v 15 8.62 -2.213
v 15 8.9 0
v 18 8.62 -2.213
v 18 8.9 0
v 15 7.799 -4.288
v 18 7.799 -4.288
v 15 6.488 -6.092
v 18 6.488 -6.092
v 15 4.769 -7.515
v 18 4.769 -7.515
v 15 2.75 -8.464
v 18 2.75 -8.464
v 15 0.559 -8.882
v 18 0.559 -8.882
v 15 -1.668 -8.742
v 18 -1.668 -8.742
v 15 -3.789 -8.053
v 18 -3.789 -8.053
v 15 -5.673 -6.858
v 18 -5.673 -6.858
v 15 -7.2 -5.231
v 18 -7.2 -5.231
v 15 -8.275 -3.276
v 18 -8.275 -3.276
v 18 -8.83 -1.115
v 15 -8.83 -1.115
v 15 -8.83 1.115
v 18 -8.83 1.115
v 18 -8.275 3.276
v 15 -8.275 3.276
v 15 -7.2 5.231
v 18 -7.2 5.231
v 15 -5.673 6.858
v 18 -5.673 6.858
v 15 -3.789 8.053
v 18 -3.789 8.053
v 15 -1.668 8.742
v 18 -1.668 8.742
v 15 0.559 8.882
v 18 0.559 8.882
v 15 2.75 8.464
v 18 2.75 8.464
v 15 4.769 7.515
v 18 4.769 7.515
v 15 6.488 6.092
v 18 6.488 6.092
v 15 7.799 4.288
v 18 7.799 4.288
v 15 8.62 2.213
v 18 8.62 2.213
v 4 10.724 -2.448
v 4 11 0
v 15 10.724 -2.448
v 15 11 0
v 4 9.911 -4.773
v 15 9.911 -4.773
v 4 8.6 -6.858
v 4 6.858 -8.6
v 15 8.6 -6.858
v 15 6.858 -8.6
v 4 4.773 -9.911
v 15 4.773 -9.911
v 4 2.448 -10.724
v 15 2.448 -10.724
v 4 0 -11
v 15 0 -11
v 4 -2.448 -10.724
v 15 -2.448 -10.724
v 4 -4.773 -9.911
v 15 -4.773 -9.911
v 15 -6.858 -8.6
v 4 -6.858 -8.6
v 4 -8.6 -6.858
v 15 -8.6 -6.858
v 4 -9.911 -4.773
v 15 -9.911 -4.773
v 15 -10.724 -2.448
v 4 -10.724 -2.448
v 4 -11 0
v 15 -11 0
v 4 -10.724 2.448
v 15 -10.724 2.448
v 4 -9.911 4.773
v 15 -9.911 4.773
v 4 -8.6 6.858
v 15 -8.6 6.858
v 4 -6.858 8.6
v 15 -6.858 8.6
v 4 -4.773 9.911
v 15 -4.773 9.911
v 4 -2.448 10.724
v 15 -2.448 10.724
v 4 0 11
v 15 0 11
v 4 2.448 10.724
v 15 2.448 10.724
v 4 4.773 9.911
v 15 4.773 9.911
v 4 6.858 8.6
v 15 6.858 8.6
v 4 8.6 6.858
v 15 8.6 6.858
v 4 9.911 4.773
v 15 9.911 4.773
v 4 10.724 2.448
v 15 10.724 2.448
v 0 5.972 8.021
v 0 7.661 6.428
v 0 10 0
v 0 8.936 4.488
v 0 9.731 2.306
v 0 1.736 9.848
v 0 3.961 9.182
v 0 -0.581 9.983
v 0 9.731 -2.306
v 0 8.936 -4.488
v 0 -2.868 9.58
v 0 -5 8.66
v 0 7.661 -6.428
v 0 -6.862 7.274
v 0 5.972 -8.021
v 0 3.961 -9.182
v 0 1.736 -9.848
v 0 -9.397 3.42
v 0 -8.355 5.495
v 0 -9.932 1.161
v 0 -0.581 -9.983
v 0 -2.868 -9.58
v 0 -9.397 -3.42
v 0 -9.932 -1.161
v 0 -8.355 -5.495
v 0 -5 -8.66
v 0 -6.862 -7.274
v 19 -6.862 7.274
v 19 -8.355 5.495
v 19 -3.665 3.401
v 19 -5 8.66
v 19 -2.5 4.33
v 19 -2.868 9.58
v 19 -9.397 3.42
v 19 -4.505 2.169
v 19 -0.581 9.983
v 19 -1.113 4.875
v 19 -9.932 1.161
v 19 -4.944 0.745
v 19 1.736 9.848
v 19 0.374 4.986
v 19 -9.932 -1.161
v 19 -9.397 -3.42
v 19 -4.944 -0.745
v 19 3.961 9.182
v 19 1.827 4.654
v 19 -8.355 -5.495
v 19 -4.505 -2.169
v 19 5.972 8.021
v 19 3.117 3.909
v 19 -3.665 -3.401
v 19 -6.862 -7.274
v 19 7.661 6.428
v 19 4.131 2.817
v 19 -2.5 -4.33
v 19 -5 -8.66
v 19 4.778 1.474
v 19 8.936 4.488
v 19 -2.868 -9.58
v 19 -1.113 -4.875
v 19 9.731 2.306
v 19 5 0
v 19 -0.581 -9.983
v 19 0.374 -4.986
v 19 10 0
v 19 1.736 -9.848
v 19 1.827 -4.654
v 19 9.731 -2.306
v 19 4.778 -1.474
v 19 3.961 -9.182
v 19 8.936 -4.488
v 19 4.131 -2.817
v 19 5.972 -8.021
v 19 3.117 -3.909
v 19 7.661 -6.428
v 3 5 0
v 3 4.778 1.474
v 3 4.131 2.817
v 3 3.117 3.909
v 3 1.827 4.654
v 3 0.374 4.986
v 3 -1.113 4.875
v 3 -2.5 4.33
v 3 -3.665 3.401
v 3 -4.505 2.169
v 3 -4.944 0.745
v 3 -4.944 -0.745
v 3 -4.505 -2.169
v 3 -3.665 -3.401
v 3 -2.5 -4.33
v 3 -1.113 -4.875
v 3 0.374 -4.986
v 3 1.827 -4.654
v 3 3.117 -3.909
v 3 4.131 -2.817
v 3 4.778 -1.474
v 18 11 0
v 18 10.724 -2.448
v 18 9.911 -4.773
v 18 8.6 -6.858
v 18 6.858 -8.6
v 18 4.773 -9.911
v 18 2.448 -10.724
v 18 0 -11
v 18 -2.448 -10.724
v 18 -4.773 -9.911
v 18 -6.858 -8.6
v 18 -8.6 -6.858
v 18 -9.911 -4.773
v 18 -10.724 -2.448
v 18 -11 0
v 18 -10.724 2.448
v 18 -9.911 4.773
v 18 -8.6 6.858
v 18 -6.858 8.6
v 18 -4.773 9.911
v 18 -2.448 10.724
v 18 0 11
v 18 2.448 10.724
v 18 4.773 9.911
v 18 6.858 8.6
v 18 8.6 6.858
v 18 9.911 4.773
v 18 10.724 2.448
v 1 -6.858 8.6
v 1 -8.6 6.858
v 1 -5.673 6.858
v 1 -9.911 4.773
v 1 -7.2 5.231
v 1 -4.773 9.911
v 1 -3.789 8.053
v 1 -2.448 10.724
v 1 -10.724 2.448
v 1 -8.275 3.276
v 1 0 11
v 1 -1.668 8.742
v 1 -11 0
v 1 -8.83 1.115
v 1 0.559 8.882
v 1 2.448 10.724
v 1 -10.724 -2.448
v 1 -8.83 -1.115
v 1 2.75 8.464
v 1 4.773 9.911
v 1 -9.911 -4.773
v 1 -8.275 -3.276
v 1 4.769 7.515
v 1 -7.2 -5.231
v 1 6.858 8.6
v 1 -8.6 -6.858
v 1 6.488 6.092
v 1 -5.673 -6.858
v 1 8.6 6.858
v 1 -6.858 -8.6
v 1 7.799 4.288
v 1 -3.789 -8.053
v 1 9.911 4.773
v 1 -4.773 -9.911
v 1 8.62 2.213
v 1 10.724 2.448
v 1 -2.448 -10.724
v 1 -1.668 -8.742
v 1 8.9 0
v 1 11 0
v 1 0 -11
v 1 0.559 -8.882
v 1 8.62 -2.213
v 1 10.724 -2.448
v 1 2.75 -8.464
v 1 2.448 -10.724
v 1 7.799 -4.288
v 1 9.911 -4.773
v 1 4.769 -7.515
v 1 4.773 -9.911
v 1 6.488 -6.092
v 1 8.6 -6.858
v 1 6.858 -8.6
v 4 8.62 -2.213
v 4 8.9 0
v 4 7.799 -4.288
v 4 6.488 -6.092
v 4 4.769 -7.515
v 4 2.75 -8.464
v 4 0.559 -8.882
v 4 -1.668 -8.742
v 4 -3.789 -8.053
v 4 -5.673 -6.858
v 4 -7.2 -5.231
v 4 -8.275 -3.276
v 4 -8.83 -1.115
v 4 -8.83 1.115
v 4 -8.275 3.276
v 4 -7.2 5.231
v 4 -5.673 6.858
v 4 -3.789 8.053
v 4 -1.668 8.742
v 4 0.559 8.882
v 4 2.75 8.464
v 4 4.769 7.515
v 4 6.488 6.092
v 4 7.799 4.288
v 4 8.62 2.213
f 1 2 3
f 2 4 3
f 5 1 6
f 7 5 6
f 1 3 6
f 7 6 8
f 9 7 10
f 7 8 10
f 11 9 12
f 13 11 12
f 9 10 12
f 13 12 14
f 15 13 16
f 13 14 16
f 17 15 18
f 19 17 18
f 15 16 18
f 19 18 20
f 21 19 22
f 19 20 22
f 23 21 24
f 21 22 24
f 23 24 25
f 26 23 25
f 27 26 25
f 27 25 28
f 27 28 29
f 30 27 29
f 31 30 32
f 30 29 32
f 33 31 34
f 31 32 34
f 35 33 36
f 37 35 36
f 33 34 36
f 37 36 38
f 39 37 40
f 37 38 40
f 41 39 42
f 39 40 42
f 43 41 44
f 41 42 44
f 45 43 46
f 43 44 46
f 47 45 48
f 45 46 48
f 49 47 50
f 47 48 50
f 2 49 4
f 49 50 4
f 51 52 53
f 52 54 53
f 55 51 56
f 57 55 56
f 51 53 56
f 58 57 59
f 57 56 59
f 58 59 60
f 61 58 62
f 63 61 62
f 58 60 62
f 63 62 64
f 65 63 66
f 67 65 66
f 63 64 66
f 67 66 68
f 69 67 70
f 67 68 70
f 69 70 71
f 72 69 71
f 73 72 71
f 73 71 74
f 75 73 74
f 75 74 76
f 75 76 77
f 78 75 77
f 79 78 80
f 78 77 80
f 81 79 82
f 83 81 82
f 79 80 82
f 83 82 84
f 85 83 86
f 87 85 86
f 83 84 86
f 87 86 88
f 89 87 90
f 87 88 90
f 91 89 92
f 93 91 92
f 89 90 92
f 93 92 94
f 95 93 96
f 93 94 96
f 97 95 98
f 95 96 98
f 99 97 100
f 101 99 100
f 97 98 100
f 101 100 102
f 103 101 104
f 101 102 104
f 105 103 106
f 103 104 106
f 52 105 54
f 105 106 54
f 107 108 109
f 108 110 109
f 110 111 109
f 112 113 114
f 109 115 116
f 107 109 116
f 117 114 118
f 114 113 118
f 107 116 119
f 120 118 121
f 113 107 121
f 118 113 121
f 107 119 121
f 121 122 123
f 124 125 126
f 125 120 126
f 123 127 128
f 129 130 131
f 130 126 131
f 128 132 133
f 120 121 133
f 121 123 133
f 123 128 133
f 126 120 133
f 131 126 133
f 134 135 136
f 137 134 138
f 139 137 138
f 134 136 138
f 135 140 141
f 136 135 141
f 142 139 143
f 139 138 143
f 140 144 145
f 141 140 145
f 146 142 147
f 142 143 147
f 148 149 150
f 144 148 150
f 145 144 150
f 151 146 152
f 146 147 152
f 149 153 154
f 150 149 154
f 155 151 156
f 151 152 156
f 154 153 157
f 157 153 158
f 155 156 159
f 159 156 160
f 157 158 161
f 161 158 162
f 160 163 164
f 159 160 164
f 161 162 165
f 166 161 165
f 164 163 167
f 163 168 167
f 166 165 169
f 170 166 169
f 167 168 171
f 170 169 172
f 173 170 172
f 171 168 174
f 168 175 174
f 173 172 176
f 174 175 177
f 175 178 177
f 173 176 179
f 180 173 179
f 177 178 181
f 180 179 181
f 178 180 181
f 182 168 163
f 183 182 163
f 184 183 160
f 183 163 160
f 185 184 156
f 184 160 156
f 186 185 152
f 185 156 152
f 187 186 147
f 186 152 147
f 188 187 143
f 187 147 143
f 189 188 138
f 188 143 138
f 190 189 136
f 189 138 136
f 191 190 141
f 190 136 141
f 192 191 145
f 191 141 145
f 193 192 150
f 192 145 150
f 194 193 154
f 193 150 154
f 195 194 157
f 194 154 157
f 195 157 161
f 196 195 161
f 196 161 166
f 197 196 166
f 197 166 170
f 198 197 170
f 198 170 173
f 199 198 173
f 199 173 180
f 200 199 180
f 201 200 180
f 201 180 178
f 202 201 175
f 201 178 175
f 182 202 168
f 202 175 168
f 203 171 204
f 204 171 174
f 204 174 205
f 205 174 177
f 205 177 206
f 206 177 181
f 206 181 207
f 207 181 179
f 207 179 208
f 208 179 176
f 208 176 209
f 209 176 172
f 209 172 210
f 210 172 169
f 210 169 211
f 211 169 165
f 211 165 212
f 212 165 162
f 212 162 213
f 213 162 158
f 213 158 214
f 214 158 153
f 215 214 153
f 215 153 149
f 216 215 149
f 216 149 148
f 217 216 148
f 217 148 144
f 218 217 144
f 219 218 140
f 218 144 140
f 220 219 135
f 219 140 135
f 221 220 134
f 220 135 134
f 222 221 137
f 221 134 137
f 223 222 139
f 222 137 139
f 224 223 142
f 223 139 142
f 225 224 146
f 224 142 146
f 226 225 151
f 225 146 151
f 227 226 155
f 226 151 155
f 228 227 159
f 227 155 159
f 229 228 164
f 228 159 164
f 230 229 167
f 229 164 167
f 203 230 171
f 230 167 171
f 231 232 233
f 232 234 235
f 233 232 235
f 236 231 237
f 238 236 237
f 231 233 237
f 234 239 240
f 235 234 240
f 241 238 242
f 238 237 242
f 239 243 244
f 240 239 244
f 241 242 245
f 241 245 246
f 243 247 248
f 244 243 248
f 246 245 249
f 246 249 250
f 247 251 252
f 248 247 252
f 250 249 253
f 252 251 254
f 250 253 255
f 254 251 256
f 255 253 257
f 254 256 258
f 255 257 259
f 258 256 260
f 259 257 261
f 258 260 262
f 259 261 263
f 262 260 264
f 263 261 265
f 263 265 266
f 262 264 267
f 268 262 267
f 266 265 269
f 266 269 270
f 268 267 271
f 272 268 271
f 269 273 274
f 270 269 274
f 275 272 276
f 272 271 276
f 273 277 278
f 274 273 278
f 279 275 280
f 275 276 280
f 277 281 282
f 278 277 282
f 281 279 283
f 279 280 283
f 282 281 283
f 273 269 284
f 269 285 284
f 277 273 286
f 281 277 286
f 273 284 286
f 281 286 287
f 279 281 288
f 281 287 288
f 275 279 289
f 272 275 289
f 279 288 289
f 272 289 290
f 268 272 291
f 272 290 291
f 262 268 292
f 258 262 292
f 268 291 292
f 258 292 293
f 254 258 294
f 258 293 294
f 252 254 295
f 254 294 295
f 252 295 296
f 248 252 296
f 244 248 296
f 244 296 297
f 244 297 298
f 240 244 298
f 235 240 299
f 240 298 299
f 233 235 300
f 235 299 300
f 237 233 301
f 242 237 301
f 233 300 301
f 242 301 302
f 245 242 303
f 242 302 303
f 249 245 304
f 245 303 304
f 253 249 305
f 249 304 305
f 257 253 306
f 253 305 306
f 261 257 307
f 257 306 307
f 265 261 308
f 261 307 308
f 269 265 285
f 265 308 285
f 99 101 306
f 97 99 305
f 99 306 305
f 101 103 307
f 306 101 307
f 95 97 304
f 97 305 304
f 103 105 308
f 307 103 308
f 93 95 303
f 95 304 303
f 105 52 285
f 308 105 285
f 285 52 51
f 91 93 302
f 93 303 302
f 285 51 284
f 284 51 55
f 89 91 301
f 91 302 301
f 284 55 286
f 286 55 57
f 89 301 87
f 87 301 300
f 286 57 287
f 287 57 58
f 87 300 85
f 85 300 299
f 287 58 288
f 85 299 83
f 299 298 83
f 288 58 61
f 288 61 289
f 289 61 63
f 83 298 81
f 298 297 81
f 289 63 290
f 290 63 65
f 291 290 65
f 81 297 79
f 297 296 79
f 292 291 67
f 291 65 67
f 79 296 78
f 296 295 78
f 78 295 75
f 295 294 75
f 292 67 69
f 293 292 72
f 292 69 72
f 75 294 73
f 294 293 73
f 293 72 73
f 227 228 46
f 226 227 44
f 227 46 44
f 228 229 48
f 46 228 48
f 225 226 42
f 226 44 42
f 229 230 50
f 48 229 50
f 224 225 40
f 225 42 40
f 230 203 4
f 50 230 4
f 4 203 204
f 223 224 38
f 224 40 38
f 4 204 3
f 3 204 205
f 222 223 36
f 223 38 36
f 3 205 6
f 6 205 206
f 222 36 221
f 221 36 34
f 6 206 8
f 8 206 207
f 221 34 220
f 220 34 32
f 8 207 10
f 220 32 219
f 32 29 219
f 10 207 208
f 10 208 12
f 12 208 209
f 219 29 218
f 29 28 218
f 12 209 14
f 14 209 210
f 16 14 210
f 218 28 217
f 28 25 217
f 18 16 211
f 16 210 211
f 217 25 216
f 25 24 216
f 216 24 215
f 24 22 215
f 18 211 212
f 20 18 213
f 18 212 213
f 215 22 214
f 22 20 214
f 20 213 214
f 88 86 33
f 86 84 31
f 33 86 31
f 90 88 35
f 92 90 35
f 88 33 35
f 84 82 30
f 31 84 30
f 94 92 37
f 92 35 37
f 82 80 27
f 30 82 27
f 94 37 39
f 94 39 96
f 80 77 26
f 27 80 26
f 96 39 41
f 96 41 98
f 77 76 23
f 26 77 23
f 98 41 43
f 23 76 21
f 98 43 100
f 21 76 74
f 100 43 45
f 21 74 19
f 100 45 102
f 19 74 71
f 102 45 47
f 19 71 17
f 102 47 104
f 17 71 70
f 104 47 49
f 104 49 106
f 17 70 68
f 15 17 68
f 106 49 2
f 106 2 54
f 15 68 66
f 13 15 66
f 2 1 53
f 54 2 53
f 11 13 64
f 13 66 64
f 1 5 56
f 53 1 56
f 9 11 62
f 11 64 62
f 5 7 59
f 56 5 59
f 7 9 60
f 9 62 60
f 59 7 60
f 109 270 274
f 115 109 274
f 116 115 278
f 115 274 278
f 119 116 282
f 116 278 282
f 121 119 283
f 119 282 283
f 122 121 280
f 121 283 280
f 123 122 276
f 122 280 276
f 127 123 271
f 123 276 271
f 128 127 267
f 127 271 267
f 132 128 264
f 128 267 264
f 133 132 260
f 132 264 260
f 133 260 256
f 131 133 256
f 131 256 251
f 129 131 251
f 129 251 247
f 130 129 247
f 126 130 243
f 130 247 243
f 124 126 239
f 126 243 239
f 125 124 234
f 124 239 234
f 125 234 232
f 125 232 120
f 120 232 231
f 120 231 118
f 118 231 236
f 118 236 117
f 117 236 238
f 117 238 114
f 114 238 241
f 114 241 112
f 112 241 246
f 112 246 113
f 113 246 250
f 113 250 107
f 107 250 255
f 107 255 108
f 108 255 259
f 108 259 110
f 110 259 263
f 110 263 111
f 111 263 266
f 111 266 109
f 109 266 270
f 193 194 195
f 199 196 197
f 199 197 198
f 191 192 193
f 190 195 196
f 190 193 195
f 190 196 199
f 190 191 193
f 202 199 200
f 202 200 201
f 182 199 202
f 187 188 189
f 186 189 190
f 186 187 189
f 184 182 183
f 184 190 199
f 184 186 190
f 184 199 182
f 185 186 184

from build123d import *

# Parameters (mm, degrees)
SCHIZZO2_R               = 5
TAGLIO_ESTRUSIONE1_DEPTH = 16
SMUSSO1_SIZE             = 1


with BuildPart() as part:
    # Schizzo1 → Rivoluzione1 (revolve)
    with BuildSketch(Plane.XY):
        Polygon((0, 0), (0, 11), (1, 11), (1, 8.9), (4, 8.9), (4, 11), (15, 11), (15, 8.9), (18, 8.9), (18, 11), (19, 11), (19, 0), align=None)
    revolve(axis=Axis((19, 0, 0), (-1, 0, 0)))

    # Schizzo2 → Taglio-Estrusione1 (cut)
    with BuildSketch(Plane(origin=(19, 0, 0), x_dir=(0, 0, -1), z_dir=(1, 0, 0))):
        with Locations(Location((0, 0, 0), (0, 0, 90))):
            Circle(SCHIZZO2_R)
    extrude(amount=-TAGLIO_ESTRUSIONE1_DEPTH, mode=Mode.SUBTRACT)

    # Smusso1
    smusso1_edges = [part.edges().sort_by_distance(p)[0] for p in [
        (0, -11, 0),
        (19, -11, 0),
    ]]
    chamfer(smusso1_edges, length=SMUSSO1_SIZE - 0.0001)  # a hair under: the kernel refuses the full size


solid = part.part
